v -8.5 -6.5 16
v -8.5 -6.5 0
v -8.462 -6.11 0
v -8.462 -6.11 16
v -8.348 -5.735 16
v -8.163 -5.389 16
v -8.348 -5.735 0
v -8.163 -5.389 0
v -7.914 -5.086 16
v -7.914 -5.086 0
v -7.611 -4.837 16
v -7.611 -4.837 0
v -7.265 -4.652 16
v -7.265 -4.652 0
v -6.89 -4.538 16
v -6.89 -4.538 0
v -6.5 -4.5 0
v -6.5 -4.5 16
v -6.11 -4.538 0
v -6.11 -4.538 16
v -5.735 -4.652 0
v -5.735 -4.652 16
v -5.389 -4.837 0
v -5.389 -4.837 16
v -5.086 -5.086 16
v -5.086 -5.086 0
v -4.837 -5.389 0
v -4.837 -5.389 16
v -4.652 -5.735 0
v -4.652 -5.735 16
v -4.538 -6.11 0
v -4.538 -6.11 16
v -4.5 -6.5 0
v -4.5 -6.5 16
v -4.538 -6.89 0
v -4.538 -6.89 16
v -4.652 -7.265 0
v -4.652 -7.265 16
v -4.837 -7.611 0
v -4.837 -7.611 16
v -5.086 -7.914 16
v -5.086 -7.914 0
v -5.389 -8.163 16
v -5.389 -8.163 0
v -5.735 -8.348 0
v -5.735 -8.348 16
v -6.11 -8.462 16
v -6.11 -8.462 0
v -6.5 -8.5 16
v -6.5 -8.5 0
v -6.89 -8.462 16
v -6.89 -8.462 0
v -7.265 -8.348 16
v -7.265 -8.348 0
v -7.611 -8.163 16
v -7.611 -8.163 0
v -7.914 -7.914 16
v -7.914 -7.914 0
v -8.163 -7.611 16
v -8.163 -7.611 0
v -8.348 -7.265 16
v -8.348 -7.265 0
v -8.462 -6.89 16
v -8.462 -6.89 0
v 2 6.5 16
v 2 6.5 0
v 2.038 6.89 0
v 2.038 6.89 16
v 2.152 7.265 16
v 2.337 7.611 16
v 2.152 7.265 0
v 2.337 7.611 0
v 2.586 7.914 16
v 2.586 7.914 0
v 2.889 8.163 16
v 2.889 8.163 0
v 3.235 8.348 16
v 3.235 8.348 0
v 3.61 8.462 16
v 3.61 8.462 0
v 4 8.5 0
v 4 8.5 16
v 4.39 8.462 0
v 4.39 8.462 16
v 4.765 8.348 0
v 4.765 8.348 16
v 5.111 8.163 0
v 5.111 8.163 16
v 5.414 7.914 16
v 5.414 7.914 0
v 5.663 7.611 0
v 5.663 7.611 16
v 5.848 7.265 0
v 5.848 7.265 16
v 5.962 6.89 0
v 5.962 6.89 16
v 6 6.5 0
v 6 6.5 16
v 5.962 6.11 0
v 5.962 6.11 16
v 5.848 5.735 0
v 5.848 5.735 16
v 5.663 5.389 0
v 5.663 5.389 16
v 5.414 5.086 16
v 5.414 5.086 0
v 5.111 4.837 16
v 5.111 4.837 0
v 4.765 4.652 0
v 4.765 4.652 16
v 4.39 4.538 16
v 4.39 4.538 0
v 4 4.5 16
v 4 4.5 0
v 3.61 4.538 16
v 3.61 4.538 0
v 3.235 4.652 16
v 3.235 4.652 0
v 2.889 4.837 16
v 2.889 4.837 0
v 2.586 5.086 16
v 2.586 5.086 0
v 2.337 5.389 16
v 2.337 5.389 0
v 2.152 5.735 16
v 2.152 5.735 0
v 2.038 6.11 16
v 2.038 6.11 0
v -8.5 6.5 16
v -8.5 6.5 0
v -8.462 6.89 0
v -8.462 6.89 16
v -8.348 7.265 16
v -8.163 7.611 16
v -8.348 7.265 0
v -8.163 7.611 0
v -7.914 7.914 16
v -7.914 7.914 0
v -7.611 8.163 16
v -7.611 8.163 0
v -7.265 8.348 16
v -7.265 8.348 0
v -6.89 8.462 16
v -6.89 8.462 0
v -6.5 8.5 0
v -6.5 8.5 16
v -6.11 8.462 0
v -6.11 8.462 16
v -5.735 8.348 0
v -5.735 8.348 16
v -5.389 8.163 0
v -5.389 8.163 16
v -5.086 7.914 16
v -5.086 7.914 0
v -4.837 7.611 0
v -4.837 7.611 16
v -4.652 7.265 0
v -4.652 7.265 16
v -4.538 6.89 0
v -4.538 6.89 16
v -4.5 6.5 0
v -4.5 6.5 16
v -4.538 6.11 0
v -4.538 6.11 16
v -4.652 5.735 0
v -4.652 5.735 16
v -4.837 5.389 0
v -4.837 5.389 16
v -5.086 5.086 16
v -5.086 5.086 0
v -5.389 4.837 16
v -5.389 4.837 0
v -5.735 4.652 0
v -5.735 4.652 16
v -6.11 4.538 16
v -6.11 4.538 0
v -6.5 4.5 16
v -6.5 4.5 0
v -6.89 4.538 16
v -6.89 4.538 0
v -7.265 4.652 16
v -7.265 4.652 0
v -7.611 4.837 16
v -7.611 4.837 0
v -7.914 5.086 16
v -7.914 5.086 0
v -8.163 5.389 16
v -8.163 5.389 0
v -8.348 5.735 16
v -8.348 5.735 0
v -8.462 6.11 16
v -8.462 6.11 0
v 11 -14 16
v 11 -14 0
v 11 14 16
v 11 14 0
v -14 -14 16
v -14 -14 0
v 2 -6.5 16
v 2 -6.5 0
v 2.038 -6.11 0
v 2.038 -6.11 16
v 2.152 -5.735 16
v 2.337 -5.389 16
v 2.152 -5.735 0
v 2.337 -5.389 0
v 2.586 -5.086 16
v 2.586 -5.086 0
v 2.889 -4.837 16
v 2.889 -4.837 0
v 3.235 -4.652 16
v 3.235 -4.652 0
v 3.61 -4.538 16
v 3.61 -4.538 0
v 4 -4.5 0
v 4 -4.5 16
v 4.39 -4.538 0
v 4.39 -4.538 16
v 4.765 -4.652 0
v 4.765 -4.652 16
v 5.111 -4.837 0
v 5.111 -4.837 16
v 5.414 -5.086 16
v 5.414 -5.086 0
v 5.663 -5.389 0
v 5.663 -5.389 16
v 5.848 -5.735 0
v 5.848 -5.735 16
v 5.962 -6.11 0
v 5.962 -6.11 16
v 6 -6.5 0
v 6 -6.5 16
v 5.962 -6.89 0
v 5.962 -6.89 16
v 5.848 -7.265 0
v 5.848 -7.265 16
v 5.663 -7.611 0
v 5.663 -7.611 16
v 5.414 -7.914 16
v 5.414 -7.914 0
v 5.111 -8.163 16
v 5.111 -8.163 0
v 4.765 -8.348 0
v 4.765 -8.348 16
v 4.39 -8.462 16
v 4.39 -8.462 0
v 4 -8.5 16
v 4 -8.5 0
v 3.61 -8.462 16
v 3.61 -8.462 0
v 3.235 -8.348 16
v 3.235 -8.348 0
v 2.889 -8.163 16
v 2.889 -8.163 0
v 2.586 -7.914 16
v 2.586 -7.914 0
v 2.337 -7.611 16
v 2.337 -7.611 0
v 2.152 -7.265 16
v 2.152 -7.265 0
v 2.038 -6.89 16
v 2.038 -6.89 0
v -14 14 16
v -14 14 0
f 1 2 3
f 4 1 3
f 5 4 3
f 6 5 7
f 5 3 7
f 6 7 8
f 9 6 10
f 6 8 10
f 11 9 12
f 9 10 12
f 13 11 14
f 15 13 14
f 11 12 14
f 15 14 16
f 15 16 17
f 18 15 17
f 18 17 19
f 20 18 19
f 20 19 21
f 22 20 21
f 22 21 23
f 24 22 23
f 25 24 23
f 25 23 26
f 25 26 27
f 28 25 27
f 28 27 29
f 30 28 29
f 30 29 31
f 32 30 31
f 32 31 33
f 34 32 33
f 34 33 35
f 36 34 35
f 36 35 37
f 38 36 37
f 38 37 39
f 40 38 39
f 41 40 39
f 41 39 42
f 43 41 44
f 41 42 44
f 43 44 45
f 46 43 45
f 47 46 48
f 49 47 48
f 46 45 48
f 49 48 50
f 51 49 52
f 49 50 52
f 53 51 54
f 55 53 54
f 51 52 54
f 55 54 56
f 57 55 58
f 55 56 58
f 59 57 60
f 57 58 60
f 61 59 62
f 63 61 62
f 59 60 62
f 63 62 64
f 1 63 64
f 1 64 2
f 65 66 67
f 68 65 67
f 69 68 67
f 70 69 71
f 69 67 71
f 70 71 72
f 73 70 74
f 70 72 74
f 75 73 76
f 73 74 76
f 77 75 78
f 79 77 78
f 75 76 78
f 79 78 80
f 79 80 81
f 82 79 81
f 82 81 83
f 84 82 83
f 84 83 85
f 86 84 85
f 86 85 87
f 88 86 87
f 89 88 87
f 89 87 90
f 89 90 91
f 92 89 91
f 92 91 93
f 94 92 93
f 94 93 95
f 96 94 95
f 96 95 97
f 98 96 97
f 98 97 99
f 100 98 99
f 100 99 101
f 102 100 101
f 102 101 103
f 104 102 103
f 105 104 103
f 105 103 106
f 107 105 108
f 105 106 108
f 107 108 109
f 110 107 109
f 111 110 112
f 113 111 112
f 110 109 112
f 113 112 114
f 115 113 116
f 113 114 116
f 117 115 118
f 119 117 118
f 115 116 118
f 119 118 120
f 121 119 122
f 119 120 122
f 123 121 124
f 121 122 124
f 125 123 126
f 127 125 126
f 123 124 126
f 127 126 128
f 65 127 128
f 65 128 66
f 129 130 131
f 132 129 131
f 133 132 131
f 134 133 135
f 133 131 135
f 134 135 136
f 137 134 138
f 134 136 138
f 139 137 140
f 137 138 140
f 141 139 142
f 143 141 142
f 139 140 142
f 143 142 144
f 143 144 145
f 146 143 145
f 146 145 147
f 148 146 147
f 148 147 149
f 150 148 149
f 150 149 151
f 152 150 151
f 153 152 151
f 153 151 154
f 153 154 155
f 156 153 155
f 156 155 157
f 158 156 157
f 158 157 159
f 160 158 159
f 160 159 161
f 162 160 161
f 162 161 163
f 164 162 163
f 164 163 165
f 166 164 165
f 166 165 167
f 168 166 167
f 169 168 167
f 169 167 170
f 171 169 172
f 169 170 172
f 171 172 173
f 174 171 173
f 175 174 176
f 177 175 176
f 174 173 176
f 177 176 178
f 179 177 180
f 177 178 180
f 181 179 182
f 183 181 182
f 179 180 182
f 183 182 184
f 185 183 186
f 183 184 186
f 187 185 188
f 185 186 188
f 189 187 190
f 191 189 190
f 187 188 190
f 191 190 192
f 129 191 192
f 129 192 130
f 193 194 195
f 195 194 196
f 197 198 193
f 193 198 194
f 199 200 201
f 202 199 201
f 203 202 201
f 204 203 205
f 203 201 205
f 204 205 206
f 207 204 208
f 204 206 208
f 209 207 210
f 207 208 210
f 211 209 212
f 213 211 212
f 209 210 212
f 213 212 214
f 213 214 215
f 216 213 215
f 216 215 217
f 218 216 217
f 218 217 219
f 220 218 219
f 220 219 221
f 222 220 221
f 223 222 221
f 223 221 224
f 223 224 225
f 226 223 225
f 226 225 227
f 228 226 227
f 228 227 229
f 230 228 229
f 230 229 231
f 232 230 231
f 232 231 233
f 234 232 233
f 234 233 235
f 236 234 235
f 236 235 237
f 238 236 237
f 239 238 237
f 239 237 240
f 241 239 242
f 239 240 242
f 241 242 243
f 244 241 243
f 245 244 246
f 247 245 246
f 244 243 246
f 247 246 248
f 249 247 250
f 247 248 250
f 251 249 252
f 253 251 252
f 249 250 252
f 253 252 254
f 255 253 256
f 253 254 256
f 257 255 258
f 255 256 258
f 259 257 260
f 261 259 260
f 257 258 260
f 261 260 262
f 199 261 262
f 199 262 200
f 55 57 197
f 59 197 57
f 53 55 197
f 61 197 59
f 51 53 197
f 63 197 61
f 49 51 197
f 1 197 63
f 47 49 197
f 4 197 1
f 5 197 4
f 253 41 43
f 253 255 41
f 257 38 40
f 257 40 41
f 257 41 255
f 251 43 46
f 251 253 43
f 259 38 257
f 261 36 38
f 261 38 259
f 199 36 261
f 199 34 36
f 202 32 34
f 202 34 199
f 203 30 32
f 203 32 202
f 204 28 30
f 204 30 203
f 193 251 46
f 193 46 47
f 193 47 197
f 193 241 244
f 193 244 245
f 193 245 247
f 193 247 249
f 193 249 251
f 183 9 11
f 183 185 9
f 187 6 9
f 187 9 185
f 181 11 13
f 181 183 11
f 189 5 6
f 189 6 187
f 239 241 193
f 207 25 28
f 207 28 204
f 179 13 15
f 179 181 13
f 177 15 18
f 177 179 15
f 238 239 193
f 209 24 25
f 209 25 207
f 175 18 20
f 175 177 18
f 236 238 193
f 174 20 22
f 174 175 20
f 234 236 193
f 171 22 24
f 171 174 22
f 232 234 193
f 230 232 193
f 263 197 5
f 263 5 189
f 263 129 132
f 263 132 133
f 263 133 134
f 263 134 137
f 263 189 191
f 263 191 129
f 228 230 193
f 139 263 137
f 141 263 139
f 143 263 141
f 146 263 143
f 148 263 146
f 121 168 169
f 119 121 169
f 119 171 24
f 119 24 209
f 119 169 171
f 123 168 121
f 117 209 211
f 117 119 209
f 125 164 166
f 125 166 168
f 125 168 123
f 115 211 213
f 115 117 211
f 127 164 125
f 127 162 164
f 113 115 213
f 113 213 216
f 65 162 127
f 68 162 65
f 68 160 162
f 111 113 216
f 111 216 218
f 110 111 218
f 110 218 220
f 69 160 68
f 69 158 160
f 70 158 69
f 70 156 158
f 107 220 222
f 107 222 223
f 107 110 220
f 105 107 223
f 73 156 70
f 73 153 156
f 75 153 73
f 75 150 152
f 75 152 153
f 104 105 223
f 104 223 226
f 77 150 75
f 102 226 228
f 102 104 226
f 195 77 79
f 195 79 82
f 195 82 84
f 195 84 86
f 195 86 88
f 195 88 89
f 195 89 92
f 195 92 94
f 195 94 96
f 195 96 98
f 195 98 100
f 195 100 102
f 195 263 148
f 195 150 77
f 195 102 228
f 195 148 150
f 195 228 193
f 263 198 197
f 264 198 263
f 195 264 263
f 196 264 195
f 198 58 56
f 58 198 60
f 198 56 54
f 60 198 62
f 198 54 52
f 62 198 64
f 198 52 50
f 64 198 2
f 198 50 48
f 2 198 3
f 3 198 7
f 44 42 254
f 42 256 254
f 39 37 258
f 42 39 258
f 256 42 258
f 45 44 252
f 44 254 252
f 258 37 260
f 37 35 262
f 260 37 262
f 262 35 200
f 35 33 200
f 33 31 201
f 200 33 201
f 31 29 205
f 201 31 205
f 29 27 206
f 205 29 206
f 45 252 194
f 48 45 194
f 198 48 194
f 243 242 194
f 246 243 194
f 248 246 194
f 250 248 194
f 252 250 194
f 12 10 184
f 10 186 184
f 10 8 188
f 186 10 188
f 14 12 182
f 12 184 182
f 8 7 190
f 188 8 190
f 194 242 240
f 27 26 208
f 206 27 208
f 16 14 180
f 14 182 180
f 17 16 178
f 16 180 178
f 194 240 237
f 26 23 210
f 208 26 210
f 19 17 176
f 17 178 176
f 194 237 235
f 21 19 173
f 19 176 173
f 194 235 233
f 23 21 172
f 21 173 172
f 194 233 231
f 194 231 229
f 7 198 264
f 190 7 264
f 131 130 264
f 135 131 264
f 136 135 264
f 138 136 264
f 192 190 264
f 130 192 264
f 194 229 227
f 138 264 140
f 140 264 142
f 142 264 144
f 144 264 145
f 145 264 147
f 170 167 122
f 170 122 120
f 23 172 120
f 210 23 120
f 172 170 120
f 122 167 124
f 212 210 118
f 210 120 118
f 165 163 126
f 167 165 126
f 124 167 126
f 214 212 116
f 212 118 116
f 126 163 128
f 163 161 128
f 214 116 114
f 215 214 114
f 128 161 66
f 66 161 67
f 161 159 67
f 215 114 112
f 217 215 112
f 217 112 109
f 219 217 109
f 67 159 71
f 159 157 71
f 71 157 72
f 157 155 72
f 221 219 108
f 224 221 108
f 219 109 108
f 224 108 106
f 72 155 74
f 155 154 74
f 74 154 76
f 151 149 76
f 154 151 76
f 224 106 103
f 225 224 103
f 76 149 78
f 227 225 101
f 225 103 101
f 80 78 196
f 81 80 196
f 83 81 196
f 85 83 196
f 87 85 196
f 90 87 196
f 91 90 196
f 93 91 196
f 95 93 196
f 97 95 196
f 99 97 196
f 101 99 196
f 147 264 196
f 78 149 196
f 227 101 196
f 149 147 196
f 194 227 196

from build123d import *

# Parameters (mm, degrees)
F0_W     = 28
F0_H     = 28
F1_DEPTH = 16
F3_D     = 4
F4_DEPTH = 3


with BuildPart() as f1:
    # F0 (on Top) → F1 (new body)
    with BuildSketch(Plane.XY):
        Rectangle(F0_W, F0_H)
    extrude(amount=F1_DEPTH)

    # F3 (through all)
    with Locations(Plane.XY.offset(16)):
        with Locations((4, -6.5), (-6.5, -6.5), (-6.5, 6.5), (4, 6.5)):
            Hole(F3_D / 2)

    # F4 (cut): a face of the model
    f4_faces = [f1.faces().sort_by_distance(p)[0] for p in [
        (14, 0, 8),
    ]]
    extrude(f4_faces, amount=-F4_DEPTH, mode=Mode.SUBTRACT)


solid = f1.part
